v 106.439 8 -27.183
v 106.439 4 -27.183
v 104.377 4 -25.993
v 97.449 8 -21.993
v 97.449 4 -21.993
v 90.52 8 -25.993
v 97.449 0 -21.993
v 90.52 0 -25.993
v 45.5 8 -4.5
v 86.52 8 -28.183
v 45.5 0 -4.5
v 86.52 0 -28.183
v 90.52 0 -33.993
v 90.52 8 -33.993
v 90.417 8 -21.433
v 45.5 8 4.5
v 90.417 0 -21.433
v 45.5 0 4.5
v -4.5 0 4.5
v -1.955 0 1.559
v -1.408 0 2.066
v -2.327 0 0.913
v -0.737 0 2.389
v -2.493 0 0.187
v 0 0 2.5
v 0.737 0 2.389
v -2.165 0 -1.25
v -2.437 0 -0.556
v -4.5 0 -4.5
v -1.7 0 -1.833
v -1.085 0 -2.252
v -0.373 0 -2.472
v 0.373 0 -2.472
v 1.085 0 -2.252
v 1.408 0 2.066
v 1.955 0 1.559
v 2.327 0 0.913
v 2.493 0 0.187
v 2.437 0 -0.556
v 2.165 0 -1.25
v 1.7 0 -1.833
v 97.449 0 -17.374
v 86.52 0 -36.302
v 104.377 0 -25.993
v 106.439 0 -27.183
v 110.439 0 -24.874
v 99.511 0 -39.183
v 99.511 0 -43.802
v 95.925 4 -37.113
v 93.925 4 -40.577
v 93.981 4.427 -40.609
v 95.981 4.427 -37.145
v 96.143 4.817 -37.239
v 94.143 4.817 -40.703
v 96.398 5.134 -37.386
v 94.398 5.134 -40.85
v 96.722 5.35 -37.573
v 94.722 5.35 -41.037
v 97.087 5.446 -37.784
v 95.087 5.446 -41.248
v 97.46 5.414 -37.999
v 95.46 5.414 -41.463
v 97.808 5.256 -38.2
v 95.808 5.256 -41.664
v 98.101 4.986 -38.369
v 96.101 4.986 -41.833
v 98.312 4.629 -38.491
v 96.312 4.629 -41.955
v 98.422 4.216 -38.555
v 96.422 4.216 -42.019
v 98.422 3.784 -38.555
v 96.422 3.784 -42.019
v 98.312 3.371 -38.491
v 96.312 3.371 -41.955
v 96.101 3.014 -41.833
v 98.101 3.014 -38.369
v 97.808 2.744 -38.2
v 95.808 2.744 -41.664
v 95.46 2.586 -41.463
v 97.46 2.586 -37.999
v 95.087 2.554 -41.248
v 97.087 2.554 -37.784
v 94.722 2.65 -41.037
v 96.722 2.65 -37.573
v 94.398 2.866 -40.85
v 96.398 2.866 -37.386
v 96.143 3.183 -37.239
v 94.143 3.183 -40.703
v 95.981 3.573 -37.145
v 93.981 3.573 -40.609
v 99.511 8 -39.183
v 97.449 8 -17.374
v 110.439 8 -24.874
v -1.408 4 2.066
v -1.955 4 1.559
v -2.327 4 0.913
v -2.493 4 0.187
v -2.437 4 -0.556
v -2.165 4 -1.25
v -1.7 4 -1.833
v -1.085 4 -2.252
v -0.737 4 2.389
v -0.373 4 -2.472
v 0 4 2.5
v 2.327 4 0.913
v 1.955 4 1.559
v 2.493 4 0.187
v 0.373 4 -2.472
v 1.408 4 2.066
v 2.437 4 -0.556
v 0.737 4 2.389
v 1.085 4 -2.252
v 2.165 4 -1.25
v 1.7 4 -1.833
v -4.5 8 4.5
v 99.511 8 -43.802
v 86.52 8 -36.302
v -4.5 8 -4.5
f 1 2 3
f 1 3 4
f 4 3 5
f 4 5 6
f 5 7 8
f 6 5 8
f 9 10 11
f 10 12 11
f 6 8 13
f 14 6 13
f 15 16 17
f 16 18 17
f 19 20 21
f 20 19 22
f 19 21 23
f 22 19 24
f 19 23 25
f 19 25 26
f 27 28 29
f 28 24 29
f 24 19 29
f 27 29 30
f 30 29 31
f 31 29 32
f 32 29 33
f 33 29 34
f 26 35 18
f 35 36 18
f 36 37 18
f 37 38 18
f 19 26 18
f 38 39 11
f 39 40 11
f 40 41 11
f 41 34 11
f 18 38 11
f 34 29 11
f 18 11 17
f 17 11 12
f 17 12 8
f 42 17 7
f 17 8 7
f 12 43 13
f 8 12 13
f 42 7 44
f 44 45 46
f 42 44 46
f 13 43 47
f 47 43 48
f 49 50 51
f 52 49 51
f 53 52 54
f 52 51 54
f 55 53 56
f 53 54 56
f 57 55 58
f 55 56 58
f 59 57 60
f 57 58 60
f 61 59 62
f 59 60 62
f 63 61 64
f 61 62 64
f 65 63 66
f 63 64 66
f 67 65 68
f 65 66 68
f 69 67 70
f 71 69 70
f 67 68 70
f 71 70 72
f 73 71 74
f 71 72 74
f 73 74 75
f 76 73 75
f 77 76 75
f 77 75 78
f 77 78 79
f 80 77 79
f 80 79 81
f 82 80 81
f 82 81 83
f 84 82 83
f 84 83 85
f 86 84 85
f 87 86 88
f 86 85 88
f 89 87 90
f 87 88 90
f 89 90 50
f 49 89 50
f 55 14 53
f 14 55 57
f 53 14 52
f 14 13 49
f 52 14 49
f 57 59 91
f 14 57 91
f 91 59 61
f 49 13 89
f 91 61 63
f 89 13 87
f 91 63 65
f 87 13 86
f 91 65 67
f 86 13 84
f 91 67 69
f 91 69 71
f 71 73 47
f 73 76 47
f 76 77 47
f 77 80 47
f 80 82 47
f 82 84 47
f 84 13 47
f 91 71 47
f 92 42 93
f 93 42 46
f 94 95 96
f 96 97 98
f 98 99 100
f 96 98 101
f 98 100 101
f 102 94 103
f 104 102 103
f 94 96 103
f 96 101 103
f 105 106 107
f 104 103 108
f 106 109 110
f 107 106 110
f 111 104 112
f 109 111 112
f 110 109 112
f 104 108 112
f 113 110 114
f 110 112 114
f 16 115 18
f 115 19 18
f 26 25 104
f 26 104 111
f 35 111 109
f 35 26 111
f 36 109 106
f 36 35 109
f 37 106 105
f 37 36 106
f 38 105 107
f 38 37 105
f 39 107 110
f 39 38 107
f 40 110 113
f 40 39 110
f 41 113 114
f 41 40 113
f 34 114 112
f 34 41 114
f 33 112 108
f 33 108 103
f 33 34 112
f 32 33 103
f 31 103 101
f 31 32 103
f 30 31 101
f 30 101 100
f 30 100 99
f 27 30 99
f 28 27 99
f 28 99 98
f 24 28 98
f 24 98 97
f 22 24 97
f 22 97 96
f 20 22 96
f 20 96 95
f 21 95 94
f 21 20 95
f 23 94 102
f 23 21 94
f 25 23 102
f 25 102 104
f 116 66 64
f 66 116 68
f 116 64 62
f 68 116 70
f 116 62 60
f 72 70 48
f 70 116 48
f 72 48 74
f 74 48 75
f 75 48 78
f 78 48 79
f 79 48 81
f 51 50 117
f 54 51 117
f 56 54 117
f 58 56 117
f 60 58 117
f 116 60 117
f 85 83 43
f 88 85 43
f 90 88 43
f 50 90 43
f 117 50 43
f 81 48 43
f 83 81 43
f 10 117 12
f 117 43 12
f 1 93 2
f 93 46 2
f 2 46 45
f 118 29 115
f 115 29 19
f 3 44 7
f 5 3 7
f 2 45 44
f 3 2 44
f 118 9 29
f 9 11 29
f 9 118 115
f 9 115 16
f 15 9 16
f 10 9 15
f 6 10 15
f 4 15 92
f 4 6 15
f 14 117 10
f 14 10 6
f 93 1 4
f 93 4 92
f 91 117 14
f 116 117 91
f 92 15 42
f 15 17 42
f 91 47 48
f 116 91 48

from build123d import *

# Parameters (mm, degrees)
SKETCH1_R           = 2.5
BOSS_EXTRUDE1_DEPTH = 4
BOSS_EXTRUDE2_START = 4
BOSS_EXTRUDE2_DEPTH = 4
SKETCH4_R           = 1.45
CUT_EXTRUDE1_DEPTH  = 4


# Read off the part's stored shape, not the designer's step: Boss-Extrude2
with BuildPart() as part:
    # Sketch1 → Boss-Extrude1 (new body)
    with BuildSketch(Plane(origin=(0, 0, 0), x_dir=(1, 0, 0), z_dir=(0, 1, 0))):
        Polygon((-4.5, -4.5), (45.5, -4.5), (90.417468245, 21.433112383), (97.448557159, 17.373711306), (110.438938215, 24.873711306), (106.438938215, 27.183112383), (104.376760389, 25.992513459), (97.448557159, 21.992513459), (90.520353928, 25.992513459), (90.520353928, 33.992513459), (99.510734985, 39.183112383), (99.510734985, 43.801914536), (86.520353928, 36.301914536), (86.520353928, 28.183112383), (45.5, 4.5), (-4.5, 4.5), align=None)
        with Locations(Location((0, 0, 0), (0, 0, 270))):
            Circle(SKETCH1_R, mode=Mode.SUBTRACT)
    extrude(amount=BOSS_EXTRUDE1_DEPTH)

    # Boss-Extrude2 outline → Boss-Extrude2 (add)
    with BuildSketch(Plane(origin=(0, 0, 0), x_dir=(1, 0, 0), z_dir=(0, 1, 0)).offset(BOSS_EXTRUDE2_START)):
        Polygon((99.510734985, 39.183112383), (99.510734985, 43.801914536), (86.520353928, 36.301914536), (86.520353928, 28.183112383), (45.5, 4.5), (-4.5, 4.5), (-4.5, -4.5), (45.5, -4.5), (90.417468245, 21.433112383), (97.448557159, 17.373711306), (110.438938215, 24.873711306), (106.438938215, 27.183112383), (97.448557159, 21.992513459), (90.520353928, 25.992513459), (90.520353928, 33.992513459), align=None)
    extrude(amount=BOSS_EXTRUDE2_DEPTH)

    # Sketch4 → Cut-Extrude1 (cut)
    with BuildSketch(Plane(origin=(5.910898385, 0, 10.237976321), x_dir=(-0.8660254037844413, 0, 0.4999999999999956), z_dir=(-0.4999999999999956, 0, -0.8660254037844413))):
        with Locations((-103.079781714, 4)):
            Circle(SKETCH4_R)
    extrude(amount=-CUT_EXTRUDE1_DEPTH, mode=Mode.SUBTRACT)


solid = part.part
